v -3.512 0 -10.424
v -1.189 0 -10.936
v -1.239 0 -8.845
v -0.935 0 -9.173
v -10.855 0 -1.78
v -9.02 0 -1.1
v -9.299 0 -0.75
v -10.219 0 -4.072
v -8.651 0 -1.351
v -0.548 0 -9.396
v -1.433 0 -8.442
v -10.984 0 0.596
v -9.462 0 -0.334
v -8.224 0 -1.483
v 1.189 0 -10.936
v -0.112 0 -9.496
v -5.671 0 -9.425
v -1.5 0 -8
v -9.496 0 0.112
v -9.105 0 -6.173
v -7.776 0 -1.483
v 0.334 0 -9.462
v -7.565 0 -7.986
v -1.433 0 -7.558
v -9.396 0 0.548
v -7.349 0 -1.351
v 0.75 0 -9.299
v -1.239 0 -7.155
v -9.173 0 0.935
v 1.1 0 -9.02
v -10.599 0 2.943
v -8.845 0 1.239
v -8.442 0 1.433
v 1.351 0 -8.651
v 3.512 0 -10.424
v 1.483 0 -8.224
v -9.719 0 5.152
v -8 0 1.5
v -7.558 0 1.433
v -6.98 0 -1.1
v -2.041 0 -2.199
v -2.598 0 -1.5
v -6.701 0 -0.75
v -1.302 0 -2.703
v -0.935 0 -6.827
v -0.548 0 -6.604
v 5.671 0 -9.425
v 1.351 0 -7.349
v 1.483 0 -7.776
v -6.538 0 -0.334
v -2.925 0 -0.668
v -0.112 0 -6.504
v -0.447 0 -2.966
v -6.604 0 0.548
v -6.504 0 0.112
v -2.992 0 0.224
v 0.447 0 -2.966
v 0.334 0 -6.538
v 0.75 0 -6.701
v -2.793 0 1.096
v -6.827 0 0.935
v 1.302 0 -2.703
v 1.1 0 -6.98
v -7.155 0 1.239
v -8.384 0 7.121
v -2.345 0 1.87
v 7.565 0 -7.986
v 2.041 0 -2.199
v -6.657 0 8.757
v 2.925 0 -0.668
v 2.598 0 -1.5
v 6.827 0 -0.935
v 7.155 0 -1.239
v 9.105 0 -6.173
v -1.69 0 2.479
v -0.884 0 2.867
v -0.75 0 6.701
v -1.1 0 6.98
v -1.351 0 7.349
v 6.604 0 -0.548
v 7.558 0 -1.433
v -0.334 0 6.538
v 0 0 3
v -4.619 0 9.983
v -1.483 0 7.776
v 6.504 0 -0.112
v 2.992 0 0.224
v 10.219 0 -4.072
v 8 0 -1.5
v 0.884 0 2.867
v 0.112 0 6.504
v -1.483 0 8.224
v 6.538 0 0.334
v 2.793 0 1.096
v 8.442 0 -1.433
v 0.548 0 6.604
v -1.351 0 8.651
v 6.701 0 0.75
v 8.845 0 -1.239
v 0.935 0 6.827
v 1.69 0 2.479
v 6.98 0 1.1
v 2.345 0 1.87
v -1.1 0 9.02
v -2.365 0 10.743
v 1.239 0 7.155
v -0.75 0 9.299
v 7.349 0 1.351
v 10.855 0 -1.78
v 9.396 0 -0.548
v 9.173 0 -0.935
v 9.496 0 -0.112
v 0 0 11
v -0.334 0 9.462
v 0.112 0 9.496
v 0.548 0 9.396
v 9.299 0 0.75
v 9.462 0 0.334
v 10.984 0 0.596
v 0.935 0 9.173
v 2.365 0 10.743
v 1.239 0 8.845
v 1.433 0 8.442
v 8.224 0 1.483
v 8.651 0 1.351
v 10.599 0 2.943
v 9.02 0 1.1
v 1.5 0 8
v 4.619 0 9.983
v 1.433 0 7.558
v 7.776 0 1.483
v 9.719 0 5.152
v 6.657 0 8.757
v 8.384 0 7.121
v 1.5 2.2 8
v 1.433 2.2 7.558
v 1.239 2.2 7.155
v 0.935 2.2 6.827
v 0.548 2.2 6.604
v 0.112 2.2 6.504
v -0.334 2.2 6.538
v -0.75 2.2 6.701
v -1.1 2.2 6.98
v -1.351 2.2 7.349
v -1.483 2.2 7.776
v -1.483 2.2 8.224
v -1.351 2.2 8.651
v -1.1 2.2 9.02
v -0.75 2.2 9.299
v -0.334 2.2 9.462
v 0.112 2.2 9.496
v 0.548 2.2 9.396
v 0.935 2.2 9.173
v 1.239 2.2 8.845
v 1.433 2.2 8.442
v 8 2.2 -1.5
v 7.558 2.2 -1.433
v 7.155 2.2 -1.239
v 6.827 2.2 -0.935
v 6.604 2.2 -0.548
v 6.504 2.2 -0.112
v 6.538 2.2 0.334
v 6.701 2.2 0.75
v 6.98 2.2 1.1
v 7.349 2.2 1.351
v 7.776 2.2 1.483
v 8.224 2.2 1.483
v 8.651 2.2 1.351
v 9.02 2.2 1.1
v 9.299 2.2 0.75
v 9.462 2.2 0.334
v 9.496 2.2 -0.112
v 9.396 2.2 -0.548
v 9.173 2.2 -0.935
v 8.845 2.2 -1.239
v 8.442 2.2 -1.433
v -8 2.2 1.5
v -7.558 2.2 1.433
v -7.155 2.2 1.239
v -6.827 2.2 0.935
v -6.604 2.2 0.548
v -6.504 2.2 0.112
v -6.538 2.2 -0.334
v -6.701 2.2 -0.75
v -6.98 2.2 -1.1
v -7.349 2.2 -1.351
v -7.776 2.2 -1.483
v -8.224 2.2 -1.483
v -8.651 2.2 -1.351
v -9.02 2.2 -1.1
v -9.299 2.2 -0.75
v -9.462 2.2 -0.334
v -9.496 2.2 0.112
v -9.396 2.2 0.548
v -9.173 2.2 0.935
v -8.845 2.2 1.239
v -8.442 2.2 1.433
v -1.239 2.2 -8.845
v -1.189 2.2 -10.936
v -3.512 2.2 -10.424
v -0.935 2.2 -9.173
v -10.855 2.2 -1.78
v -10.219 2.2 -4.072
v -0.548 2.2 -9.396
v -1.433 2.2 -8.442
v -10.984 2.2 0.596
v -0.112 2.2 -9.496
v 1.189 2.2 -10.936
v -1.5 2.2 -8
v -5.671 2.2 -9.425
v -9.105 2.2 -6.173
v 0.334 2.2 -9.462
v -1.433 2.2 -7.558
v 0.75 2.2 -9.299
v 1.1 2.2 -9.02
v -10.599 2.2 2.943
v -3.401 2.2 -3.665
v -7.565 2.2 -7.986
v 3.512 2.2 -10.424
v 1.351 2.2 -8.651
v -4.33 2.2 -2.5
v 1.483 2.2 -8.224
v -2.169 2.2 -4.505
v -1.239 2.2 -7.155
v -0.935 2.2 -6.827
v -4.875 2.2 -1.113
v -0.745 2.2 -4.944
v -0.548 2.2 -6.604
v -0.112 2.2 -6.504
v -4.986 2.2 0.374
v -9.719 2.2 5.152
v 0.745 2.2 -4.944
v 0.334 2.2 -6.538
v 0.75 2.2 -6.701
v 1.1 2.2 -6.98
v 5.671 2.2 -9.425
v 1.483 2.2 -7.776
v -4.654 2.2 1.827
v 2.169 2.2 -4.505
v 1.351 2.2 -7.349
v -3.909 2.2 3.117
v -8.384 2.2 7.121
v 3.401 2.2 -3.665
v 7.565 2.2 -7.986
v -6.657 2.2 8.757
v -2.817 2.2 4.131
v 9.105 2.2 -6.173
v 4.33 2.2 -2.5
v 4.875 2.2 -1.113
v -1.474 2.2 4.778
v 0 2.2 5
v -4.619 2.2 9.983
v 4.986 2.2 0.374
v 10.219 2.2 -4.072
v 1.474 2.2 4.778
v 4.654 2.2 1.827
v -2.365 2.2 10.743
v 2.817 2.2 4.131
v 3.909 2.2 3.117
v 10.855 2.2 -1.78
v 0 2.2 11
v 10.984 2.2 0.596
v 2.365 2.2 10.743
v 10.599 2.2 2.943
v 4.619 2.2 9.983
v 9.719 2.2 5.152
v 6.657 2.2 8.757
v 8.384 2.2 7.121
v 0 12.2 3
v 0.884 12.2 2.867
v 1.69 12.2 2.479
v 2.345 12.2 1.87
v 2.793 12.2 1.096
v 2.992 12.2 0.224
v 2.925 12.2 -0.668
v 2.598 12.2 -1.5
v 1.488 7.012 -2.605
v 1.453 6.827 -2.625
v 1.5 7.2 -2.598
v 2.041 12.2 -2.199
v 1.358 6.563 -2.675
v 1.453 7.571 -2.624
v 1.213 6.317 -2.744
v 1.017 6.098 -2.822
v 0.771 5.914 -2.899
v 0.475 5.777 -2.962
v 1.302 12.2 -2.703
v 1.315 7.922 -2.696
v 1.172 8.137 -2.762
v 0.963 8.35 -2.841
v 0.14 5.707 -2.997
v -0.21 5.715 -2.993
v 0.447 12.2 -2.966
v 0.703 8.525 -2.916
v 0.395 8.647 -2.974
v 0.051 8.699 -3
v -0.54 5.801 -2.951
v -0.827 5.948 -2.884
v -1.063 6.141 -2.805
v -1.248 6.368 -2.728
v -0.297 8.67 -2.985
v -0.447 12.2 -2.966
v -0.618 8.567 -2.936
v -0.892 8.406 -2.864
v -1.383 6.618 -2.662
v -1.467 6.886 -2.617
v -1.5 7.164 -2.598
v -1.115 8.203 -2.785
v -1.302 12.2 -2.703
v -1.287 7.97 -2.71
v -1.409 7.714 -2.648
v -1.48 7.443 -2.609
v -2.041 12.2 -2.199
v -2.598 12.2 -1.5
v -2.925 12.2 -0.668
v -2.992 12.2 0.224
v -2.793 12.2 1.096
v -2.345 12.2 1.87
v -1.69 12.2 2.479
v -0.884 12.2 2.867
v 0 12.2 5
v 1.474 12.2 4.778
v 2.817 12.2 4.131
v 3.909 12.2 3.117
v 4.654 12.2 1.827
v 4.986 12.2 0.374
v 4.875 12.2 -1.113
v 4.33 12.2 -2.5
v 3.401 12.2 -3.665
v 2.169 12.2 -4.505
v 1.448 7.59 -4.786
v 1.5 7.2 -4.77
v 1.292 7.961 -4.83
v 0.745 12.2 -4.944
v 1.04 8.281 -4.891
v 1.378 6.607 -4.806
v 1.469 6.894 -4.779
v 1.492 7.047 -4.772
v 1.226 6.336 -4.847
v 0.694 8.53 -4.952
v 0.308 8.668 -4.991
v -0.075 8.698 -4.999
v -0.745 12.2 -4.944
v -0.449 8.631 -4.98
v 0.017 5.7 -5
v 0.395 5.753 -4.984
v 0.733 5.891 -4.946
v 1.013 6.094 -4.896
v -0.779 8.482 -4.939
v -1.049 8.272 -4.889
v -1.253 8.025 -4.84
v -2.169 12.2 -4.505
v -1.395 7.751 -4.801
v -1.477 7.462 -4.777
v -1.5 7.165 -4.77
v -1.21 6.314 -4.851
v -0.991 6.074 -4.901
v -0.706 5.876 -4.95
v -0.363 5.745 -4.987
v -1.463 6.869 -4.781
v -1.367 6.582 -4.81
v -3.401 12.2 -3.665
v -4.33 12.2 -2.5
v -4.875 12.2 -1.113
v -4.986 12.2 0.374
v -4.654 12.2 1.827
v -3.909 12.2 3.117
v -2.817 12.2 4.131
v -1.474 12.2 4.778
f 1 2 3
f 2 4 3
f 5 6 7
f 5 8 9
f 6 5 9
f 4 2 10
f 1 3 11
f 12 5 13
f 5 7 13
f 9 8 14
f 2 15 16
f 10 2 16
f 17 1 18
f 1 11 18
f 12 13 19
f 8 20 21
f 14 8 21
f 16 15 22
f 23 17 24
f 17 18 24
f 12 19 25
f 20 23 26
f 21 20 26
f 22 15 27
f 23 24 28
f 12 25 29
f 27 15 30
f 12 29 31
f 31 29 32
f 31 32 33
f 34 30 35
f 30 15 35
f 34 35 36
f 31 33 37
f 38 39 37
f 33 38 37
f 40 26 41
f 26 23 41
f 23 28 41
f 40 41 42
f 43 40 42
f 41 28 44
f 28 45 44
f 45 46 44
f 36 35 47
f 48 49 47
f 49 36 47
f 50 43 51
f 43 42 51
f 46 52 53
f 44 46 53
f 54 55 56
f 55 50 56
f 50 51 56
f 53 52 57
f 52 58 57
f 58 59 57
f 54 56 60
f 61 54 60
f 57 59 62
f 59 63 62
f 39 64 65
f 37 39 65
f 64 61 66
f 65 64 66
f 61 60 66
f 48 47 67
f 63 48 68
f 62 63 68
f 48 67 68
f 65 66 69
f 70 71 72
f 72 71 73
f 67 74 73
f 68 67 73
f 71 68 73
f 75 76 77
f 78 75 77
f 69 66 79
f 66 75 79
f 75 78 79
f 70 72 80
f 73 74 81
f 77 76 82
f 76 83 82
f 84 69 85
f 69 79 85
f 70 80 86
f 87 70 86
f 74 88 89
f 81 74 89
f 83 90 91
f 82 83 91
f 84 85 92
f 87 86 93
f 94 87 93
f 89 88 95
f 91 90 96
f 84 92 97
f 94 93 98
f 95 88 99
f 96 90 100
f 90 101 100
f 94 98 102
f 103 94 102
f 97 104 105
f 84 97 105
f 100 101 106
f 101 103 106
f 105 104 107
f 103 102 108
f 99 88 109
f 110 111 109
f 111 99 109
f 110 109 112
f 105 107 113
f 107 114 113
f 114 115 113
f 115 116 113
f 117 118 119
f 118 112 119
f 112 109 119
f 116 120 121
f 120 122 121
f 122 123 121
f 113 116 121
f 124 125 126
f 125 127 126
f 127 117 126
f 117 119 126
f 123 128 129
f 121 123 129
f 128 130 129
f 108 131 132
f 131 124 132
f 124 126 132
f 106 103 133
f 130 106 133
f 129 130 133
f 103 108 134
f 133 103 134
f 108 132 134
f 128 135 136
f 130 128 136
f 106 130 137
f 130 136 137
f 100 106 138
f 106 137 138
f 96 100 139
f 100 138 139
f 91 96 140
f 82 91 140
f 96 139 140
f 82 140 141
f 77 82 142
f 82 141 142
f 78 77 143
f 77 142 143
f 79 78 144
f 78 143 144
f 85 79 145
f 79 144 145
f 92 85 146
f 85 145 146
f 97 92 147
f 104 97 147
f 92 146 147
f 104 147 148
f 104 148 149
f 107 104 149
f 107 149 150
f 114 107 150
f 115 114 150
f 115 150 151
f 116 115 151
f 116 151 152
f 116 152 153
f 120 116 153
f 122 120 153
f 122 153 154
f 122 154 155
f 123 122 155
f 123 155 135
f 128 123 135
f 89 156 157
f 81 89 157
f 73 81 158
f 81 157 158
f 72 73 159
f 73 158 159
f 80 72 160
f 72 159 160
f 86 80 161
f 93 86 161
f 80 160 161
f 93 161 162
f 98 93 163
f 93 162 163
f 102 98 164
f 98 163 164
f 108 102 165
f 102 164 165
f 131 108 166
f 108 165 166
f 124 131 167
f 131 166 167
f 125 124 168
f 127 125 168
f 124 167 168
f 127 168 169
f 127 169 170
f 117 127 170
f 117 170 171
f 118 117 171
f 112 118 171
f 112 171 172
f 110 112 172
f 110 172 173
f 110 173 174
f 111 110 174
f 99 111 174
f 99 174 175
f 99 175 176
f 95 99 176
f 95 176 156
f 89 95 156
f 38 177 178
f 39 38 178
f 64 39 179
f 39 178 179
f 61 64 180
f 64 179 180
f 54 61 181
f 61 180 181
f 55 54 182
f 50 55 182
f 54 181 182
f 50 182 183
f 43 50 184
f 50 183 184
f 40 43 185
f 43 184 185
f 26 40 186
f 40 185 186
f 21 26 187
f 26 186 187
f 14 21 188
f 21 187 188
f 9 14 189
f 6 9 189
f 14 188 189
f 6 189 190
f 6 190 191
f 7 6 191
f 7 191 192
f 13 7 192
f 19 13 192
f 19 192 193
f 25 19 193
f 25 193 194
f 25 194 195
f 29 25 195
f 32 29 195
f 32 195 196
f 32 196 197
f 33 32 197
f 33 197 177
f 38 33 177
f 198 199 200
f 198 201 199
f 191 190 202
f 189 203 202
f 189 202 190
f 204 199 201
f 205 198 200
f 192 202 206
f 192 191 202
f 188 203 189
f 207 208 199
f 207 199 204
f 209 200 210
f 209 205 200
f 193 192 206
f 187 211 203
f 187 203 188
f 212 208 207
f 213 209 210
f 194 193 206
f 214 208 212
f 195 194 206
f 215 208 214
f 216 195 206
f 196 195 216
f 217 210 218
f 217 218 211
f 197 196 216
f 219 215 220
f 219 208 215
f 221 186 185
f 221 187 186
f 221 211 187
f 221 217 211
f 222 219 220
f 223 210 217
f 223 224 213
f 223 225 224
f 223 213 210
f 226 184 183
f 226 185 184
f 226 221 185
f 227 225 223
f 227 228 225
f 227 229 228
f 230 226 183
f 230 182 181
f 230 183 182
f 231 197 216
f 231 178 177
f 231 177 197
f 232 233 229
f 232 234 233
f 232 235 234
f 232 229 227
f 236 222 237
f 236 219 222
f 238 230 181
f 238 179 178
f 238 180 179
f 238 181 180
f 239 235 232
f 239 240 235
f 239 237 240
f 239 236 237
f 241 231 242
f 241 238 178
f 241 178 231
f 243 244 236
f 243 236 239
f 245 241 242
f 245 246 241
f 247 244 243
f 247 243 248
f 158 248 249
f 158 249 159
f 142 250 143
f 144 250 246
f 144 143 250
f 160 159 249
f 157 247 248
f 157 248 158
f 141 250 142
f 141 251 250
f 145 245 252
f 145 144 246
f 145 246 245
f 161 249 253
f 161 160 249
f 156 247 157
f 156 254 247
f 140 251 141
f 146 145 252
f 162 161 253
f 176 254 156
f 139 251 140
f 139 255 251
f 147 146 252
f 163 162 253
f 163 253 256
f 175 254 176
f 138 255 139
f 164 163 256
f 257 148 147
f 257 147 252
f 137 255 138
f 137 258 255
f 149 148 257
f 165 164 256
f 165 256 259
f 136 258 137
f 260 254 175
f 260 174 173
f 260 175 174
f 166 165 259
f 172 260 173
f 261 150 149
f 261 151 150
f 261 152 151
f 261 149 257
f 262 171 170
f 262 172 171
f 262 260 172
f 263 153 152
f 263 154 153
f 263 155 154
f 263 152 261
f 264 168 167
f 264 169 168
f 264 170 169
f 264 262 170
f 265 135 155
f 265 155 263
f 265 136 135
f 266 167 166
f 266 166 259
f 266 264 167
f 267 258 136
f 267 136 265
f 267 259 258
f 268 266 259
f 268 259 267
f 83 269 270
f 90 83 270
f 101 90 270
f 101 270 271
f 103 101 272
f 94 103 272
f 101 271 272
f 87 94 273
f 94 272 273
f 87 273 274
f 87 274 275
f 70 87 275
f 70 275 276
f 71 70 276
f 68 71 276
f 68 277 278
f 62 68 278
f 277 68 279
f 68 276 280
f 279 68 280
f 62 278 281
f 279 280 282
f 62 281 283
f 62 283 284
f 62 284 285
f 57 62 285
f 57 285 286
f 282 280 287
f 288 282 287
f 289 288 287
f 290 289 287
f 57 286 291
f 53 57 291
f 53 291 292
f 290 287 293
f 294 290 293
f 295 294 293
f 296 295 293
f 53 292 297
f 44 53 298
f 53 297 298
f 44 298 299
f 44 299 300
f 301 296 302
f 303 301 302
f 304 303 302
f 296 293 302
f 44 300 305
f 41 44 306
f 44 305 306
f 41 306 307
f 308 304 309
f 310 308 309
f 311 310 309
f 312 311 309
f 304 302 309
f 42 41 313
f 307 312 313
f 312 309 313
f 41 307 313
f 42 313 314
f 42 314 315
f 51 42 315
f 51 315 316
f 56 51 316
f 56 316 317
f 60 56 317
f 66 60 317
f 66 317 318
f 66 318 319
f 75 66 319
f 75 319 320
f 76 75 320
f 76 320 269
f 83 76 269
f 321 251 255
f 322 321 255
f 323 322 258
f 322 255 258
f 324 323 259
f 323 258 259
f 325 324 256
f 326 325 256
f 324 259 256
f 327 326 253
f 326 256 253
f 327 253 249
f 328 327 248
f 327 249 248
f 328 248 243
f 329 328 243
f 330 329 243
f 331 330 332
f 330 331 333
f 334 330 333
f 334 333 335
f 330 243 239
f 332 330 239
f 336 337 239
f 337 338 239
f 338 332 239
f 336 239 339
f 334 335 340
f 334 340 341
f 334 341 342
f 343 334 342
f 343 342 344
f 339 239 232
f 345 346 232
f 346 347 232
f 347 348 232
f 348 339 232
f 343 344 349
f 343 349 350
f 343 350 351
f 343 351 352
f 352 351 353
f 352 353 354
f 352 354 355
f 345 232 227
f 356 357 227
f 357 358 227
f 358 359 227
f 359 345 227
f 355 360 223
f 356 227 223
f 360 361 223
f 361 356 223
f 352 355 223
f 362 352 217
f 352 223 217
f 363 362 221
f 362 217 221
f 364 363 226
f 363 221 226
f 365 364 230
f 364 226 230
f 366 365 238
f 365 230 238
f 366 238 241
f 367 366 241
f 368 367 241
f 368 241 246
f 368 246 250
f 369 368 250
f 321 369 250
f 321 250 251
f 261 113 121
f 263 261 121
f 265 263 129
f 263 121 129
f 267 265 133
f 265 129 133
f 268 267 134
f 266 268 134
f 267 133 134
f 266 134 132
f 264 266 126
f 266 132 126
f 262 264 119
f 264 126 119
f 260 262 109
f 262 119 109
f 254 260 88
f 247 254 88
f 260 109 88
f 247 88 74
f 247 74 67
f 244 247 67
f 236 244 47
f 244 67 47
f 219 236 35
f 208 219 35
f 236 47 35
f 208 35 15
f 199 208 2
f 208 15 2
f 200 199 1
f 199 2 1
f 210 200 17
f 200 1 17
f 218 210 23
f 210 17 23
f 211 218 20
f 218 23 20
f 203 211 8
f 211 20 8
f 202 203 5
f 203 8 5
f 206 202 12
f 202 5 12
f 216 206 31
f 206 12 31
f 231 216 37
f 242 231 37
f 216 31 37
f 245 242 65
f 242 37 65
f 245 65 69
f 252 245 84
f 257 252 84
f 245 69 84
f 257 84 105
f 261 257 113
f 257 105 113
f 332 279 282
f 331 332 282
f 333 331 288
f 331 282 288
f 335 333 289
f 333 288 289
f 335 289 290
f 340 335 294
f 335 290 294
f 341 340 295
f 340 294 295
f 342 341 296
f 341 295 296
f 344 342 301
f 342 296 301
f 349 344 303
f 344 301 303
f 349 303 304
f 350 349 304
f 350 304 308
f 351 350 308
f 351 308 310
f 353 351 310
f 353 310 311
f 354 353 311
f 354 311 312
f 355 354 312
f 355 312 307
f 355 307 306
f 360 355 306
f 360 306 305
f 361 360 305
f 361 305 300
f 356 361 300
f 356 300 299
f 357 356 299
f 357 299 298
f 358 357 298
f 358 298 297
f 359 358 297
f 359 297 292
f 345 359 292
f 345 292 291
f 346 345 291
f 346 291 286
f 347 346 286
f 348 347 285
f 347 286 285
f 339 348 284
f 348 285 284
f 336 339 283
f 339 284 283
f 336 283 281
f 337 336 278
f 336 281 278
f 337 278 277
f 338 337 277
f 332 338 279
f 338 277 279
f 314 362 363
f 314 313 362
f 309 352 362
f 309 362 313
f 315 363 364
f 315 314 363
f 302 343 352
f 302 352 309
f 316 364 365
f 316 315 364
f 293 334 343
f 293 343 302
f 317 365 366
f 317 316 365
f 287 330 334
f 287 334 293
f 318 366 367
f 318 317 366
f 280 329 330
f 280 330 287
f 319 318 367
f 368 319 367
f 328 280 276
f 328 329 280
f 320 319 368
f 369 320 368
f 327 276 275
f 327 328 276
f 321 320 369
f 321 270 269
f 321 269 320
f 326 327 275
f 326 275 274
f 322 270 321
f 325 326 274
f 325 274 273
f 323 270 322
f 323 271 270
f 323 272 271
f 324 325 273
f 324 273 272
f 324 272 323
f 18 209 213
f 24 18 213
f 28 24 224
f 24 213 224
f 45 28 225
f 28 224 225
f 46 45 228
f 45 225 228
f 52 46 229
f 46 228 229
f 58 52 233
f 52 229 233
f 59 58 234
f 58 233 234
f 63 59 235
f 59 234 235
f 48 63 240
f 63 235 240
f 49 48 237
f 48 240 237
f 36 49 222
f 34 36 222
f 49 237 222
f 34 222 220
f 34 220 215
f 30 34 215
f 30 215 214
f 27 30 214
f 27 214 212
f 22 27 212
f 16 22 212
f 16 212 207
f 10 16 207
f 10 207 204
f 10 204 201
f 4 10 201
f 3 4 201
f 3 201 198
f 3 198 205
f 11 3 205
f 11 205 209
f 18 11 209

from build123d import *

# Parameters (mm, degrees)
SKETCH_1_R               = 11
EXTRUDE_1_DEPTH          = 2.2
SKETCH_2_R               = 5
EXTRUDE_2_DEPTH          = 10
SKETCH_3_R               = 3
CUT_EXTRUDE_1_DEPTH      = 15
SKETCH_4_R               = 1.5
CUT_EXTRUDE_2_DEPTH      = 15
SKETCH_5_R               = 1.5
CUT_EXTRUDE_3_DEPTH      = 15
PATTERN_CIRCULAR_1_COUNT = 4


with BuildPart() as part:
    # 草图1 → 凸台-拉伸1 (new body)
    with BuildSketch(Plane(origin=(0, 0, 0), x_dir=(1, 0, 0), z_dir=(0, 1, 0))):
        Circle(SKETCH_1_R)
    extrude(amount=EXTRUDE_1_DEPTH)

    # 草图2 → 凸台-拉伸2 (add)
    with BuildSketch(Plane(origin=(0, 2.2, 0), x_dir=(1, 0, 0), z_dir=(0, 1, 0))):
        Circle(SKETCH_2_R)
    extrude(amount=EXTRUDE_2_DEPTH)

    # 草图3 → 切除-拉伸1 (cut)
    with BuildSketch(Plane(origin=(0, 12.2, 0), x_dir=(1, 0, 0), z_dir=(0, 1, 0))):
        Circle(SKETCH_3_R)
    extrude(amount=-CUT_EXTRUDE_1_DEPTH, mode=Mode.SUBTRACT)

    # 草图4 → 切除-拉伸2 (cut)
    with BuildSketch(Plane.XY):
        with Locations((0, 7.2)):
            Circle(SKETCH_4_R)
    extrude(amount=-CUT_EXTRUDE_2_DEPTH, mode=Mode.SUBTRACT)

    # 草图5 → 切除-拉伸3 (cut)
    with BuildSketch(Plane(origin=(0, 2.2, 0), x_dir=(1, 0, 0), z_dir=(0, 1, 0))):
        with Locations((-8, 0)):
            Circle(SKETCH_5_R)
    cut_extrude_3 = extrude(amount=-CUT_EXTRUDE_3_DEPTH, mode=Mode.SUBTRACT)

    # 阵列(圆周)1: 切除-拉伸3 ×4 about axis
    pattern_circular_1_axis = Axis((0, 12.2, 0), (0, -1, 0))
    for i in range(1, PATTERN_CIRCULAR_1_COUNT):
        add(cut_extrude_3.rotate(pattern_circular_1_axis, i * 360 / PATTERN_CIRCULAR_1_COUNT), mode=Mode.SUBTRACT)


solid = part.part
